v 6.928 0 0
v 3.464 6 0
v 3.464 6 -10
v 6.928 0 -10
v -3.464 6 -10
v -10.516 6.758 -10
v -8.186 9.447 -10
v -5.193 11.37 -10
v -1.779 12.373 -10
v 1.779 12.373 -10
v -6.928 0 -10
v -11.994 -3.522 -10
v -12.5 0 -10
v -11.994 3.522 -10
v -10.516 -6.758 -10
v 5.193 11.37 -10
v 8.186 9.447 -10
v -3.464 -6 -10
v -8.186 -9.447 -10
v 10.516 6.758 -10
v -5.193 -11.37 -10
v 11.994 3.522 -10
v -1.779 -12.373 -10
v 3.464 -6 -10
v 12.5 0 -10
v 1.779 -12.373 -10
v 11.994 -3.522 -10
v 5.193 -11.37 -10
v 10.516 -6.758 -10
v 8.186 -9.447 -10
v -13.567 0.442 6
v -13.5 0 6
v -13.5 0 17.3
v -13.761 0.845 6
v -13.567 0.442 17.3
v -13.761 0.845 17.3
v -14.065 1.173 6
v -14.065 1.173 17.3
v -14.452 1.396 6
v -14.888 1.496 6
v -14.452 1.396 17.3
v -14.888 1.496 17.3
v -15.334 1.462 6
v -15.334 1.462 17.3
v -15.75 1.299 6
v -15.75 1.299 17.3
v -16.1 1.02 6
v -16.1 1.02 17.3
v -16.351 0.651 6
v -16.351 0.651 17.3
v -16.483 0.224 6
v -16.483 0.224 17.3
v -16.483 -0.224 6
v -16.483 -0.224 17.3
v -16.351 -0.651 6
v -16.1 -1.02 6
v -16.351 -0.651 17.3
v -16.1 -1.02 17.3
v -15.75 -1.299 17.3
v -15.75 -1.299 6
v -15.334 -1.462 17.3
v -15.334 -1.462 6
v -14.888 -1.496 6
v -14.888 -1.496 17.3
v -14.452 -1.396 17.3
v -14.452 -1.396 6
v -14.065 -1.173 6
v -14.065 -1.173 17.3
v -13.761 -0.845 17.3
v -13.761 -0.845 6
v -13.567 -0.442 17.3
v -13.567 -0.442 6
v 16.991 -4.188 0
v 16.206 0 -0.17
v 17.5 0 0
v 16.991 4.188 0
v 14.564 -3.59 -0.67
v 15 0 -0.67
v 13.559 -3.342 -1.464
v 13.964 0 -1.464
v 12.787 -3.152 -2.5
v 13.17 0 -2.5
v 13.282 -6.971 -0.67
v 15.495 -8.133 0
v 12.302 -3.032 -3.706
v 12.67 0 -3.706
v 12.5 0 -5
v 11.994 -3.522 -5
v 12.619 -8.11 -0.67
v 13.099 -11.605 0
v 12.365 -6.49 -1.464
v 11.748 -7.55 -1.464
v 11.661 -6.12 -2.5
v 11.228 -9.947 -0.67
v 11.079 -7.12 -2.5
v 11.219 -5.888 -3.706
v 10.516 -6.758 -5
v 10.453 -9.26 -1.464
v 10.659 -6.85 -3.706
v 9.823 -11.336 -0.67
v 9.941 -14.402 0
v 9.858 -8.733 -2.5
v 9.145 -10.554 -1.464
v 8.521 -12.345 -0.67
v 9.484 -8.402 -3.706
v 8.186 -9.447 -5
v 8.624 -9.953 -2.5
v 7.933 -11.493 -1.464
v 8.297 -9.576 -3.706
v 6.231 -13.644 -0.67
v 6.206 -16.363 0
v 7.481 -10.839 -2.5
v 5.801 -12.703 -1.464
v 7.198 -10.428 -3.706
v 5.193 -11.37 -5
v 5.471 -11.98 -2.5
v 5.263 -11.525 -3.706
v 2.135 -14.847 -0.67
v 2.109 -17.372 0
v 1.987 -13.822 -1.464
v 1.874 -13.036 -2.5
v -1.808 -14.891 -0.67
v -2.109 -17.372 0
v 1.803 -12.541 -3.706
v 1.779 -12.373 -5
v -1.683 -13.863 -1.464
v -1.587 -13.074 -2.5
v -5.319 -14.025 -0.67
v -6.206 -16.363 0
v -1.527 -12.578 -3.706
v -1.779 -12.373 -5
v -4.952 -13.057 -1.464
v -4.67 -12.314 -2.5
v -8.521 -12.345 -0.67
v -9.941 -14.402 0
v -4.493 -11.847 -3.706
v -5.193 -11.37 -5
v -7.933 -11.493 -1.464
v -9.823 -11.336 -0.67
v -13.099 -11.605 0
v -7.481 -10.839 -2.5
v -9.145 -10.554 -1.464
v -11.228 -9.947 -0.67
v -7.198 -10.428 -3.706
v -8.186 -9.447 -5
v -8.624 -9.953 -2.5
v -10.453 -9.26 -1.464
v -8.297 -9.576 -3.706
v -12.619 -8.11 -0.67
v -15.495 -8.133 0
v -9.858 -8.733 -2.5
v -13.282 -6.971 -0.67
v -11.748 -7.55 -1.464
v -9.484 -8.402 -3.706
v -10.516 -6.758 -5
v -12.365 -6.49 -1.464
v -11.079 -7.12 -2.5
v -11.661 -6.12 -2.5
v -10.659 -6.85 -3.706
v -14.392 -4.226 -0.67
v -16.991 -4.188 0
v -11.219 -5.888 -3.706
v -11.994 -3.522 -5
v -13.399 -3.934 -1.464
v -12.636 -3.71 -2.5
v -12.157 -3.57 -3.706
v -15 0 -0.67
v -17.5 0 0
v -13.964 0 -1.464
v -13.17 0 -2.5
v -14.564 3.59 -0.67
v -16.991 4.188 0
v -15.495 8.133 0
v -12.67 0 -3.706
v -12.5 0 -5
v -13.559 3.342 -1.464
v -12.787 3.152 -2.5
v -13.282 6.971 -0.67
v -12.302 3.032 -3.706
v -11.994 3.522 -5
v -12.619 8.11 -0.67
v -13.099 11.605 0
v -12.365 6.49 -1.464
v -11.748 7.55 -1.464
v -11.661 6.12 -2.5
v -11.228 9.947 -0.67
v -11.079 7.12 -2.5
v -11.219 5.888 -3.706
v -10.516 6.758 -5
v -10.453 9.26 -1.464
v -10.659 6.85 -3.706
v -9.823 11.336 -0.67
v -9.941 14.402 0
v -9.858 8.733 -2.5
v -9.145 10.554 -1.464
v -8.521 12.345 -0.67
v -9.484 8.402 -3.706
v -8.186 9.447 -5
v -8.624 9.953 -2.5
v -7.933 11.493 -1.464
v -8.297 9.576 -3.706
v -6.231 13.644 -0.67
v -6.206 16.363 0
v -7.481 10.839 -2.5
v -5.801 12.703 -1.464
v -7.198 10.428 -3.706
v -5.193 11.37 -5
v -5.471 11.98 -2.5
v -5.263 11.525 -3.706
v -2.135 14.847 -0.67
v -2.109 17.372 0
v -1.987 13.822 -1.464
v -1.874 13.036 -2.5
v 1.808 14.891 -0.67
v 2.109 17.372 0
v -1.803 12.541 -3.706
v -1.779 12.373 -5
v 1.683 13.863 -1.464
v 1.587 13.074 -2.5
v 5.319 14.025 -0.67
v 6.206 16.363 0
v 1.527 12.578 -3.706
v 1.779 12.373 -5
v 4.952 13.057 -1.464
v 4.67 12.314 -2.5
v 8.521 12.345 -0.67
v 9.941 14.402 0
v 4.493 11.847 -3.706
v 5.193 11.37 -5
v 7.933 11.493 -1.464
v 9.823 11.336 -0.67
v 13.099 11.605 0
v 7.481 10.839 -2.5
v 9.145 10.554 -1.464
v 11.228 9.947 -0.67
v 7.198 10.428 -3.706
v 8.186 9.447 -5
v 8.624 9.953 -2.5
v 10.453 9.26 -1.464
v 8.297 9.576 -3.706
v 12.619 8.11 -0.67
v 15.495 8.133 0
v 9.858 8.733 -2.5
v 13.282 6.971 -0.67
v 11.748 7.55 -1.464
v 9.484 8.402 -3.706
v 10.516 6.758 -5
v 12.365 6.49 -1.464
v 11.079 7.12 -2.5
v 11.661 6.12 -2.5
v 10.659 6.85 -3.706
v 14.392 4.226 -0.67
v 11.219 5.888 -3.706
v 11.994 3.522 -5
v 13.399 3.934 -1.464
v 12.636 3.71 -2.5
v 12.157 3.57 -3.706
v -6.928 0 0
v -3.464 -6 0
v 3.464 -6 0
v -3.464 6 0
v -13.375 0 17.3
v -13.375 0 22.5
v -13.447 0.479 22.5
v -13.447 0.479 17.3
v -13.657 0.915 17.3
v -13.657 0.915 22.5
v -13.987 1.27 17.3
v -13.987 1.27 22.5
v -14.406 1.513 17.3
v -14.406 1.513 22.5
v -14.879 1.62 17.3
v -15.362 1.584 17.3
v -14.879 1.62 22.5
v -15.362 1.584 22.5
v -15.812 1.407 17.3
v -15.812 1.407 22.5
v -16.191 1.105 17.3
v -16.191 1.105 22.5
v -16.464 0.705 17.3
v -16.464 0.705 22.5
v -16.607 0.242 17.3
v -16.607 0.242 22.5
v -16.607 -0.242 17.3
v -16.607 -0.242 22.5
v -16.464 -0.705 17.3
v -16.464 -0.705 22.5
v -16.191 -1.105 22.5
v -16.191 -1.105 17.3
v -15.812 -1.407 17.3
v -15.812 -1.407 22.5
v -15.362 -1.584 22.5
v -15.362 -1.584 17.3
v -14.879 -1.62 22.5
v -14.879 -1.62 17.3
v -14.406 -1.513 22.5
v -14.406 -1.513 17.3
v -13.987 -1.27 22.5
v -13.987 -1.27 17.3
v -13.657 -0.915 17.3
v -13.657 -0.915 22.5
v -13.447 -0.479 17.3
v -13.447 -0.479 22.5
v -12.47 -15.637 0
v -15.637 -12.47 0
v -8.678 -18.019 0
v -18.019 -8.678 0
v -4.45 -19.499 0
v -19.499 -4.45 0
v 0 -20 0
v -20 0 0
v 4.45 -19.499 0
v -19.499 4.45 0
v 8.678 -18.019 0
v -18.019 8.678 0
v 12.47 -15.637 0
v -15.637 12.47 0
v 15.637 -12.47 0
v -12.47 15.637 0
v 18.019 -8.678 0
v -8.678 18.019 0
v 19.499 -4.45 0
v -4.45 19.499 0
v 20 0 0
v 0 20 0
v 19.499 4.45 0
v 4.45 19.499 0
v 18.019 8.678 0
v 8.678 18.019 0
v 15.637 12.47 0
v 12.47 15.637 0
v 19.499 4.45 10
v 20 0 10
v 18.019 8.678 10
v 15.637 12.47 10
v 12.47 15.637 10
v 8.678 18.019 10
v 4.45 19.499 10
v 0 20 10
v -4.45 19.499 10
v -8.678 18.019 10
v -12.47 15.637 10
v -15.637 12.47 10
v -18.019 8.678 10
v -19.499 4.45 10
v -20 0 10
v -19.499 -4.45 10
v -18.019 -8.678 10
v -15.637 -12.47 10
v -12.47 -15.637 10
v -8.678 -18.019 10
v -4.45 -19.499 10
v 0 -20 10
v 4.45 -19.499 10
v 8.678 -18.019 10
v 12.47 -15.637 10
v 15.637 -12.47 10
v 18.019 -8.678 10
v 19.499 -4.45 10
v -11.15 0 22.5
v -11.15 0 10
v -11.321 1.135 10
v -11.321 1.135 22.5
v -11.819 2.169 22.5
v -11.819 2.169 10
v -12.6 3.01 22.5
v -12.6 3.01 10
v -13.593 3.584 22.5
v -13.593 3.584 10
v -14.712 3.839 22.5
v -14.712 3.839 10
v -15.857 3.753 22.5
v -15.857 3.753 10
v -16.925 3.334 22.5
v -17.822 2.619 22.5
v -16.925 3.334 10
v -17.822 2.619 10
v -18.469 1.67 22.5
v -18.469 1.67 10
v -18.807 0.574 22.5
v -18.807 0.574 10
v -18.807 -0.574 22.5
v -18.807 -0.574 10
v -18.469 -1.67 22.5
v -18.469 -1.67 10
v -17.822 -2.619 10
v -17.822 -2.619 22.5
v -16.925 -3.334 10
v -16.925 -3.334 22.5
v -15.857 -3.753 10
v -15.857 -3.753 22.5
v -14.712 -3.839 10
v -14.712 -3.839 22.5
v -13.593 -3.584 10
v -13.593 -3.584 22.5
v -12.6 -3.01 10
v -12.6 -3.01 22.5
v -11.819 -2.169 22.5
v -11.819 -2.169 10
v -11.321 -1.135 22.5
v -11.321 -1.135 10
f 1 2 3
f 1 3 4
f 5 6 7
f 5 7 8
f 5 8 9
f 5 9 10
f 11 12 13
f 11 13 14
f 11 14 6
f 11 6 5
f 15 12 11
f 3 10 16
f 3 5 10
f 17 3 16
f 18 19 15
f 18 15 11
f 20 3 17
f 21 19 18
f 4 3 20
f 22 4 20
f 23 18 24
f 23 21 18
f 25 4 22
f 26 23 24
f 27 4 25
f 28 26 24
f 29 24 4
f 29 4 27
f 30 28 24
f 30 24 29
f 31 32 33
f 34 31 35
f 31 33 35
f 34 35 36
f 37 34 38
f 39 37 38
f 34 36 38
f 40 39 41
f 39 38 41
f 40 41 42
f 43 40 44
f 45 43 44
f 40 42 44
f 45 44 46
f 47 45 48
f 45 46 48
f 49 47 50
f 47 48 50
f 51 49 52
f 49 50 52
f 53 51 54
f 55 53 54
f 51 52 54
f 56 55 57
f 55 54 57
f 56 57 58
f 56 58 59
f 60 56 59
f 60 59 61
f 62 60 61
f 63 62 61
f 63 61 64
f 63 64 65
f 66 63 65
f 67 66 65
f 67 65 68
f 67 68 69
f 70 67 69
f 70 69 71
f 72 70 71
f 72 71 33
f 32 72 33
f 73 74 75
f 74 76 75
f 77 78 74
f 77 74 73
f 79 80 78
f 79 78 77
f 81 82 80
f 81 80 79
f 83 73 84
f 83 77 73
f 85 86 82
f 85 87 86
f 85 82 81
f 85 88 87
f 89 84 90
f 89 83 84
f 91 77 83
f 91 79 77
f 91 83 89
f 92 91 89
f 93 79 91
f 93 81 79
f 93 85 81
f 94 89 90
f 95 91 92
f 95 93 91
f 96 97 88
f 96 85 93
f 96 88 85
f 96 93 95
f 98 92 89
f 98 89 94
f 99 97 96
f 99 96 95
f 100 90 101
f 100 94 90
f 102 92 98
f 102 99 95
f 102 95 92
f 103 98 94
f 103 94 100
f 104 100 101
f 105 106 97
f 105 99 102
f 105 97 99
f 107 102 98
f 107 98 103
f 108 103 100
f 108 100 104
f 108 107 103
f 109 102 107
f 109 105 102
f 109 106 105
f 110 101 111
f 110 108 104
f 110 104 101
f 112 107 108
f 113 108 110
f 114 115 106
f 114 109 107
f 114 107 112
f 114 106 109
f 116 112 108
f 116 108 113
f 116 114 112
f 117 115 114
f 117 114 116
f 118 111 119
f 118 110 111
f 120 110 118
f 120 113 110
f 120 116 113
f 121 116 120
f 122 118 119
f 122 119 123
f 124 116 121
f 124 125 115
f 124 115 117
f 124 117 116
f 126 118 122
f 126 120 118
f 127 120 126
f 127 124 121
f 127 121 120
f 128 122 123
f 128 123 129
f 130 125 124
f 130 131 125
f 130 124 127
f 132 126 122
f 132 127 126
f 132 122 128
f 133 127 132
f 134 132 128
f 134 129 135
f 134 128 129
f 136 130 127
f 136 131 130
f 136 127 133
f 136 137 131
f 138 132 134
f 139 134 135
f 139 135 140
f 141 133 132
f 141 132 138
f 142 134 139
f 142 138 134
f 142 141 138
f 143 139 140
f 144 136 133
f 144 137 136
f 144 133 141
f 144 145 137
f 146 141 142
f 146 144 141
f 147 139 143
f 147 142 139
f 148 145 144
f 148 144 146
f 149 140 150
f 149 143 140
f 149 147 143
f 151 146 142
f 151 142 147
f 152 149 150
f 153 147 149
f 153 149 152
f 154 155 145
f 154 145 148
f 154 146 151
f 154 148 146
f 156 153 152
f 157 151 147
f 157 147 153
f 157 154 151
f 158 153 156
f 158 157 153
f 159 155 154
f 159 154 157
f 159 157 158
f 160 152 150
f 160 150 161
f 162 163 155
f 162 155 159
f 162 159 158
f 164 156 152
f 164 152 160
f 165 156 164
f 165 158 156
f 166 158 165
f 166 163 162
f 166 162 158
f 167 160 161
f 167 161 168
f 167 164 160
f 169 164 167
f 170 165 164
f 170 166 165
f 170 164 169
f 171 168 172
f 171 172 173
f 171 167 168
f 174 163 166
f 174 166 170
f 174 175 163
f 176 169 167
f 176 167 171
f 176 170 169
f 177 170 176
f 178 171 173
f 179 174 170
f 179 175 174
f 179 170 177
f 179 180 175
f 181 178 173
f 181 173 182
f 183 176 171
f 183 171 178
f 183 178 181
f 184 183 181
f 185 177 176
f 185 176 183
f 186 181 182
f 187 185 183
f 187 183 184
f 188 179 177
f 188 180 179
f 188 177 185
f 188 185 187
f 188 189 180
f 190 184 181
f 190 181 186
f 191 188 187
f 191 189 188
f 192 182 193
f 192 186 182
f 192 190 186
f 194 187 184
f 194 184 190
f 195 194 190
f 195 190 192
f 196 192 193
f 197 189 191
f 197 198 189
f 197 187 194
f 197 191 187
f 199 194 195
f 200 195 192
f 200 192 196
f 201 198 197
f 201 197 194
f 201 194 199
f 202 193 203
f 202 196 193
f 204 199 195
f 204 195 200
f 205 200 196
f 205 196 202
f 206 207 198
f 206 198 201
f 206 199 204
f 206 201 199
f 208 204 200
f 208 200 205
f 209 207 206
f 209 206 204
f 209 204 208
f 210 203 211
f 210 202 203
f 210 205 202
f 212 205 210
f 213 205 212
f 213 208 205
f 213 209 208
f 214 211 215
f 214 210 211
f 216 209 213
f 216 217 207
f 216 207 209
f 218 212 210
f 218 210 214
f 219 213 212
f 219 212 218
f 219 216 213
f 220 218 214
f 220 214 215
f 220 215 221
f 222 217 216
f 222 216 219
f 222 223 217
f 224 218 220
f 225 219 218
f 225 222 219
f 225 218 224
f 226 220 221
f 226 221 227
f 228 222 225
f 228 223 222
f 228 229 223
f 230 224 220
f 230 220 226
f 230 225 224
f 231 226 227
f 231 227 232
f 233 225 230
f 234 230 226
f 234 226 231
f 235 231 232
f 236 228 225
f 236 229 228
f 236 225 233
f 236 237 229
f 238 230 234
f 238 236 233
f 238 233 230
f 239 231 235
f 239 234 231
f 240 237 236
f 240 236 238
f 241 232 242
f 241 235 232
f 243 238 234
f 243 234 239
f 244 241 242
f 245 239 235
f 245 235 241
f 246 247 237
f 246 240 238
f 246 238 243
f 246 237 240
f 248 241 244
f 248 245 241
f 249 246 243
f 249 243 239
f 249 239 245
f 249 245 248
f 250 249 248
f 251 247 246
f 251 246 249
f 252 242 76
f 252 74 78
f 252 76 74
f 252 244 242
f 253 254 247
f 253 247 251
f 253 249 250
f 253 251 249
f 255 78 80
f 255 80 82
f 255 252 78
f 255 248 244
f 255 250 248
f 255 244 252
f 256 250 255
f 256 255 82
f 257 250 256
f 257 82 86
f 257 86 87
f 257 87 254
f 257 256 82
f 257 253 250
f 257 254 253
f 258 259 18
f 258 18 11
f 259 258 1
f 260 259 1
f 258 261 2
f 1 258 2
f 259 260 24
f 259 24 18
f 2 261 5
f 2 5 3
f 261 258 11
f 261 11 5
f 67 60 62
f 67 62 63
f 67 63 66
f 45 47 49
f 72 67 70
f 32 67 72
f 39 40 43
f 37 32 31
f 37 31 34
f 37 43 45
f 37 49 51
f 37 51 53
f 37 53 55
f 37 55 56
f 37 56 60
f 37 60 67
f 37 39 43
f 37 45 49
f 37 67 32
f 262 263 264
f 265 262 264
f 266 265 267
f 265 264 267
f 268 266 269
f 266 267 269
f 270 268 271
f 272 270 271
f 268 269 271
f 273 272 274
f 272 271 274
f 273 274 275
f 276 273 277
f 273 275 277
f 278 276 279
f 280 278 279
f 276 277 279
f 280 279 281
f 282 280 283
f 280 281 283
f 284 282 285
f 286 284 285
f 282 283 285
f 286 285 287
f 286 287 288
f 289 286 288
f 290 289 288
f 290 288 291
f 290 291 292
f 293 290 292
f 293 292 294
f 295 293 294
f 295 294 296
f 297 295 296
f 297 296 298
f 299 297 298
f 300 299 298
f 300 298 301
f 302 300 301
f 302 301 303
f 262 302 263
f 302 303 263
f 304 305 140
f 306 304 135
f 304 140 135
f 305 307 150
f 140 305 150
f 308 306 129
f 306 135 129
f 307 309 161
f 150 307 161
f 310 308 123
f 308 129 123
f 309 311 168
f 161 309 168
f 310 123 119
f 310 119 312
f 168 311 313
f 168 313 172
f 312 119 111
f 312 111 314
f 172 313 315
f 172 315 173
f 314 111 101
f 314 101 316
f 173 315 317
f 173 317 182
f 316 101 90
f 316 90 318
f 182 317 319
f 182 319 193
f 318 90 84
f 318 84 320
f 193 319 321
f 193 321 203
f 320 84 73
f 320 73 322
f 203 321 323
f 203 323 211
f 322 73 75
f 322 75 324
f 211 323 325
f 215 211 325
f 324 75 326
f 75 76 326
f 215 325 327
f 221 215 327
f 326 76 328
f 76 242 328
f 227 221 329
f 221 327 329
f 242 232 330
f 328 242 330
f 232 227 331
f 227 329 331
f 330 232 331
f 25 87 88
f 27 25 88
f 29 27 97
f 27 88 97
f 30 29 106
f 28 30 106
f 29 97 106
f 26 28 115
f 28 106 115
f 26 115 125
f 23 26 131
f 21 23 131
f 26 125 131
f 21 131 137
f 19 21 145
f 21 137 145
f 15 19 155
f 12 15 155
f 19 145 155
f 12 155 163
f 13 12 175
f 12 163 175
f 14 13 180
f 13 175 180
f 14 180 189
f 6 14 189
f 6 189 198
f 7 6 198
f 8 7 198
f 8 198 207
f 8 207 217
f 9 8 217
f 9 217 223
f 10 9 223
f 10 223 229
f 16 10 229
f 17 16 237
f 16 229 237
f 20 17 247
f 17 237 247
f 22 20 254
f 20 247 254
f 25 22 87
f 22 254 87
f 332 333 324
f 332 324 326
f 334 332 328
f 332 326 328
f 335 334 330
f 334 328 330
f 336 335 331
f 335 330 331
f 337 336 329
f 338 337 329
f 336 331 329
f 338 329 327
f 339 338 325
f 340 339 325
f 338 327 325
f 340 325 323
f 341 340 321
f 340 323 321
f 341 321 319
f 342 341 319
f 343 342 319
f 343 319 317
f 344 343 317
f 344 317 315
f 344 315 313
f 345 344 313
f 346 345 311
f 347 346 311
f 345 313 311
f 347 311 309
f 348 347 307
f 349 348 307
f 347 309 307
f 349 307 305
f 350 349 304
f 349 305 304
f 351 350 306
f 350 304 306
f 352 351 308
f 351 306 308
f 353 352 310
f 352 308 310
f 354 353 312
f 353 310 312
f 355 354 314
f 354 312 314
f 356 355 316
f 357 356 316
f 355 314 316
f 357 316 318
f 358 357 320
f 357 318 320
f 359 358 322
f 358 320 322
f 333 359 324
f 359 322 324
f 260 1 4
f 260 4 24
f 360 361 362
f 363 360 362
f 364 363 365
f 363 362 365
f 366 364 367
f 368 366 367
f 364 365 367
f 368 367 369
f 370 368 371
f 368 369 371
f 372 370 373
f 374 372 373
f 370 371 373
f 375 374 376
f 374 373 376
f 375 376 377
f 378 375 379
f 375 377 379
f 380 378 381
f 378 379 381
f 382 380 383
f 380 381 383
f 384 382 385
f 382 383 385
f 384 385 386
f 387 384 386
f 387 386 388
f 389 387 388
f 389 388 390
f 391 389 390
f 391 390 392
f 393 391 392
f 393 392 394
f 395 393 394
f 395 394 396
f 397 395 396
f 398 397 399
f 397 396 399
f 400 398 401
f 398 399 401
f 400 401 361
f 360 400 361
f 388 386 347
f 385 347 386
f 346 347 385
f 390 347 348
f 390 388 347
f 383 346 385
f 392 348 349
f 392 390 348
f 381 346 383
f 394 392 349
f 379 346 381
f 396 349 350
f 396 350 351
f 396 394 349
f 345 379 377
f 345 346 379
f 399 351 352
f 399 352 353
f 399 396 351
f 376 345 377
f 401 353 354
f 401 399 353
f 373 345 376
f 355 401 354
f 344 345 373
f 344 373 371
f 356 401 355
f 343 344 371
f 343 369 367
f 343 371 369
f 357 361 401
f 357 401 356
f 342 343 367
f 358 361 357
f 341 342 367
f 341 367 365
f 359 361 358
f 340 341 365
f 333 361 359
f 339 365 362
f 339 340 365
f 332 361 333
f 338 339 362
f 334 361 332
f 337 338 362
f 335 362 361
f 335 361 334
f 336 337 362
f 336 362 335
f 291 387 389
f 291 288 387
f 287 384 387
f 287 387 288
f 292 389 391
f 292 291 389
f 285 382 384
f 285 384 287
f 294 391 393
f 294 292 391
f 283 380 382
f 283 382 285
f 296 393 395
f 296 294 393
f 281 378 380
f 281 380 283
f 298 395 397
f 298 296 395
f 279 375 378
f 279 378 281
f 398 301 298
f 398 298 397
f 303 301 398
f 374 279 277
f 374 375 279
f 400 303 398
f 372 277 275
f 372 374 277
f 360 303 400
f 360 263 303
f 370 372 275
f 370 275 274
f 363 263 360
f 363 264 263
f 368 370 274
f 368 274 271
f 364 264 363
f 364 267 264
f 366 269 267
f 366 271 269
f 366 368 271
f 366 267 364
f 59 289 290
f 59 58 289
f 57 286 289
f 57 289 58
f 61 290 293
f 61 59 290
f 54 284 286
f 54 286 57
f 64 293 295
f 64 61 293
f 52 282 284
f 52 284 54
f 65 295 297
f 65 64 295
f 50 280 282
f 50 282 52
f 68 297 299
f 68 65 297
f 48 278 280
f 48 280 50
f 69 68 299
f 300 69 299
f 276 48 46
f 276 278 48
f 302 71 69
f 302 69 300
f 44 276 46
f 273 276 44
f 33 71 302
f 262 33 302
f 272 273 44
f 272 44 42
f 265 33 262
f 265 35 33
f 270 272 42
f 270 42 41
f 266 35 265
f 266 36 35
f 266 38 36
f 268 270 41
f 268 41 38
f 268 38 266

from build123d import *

# Parameters (mm, degrees)
SKETCH1_R           = 20
BOSS_EXTRUDE1_DEPTH = 10
SKETCH2_R           = 3.85
BOSS_EXTRUDE2_DEPTH = 12.5
SKETCH3_R           = 12.5
BOSS_EXTRUDE3_DEPTH = 10
SKETCH5_R           = 1.5
CUT_EXTRUDE1_DEPTH  = 16.5
SKETCH6_R           = 1.625
CUT_EXTRUDE2_DEPTH  = 5.2
FILLET1_R           = 5


with BuildPart() as part:
    # Sketch1 → Boss-Extrude1 (new body)
    with BuildSketch(Plane.XY):
        Circle(SKETCH1_R)
    extrude(amount=BOSS_EXTRUDE1_DEPTH)

    # Sketch2 → Boss-Extrude2 (add)
    with BuildSketch(Plane.XY.offset(10)):
        with Locations((-15, 0)):
            Circle(SKETCH2_R)
    extrude(amount=BOSS_EXTRUDE2_DEPTH)

    # Sketch3 → Boss-Extrude3 (add)
    with BuildSketch(Plane(origin=(0, 0, 0), x_dir=(-1, 0, 0), z_dir=(0, 0, -1))):
        with Locations(Location((0, 0, 0), (0, 0, 180))):
            Circle(SKETCH3_R)
        Polygon((3.464101615, 6), (-3.464101615, 6), (-6.92820323, 0), (-3.464101615, -6), (3.464101615, -6), (6.92820323, 0), align=None, mode=Mode.SUBTRACT)
    extrude(amount=BOSS_EXTRUDE3_DEPTH)

    # Sketch5 → Cut-Extrude1 (cut)
    with BuildSketch(Plane.XY.offset(22.5)):
        with Locations((-15, 0)):
            Circle(SKETCH5_R)
    extrude(amount=-CUT_EXTRUDE1_DEPTH, mode=Mode.SUBTRACT)

    # Sketch6 → Cut-Extrude2 (cut)
    with BuildSketch(Plane.XY.offset(22.5)):
        with Locations((-15, 0)):
            Circle(SKETCH6_R)
    extrude(amount=-CUT_EXTRUDE2_DEPTH, mode=Mode.SUBTRACT)

    # Fillet1
    fillet1_edges = [part.edges().sort_by_distance(p)[0] for p in [
        (-12.5, 0, 0),
    ]]
    fillet(fillet1_edges, radius=FILLET1_R)


solid = part.part
